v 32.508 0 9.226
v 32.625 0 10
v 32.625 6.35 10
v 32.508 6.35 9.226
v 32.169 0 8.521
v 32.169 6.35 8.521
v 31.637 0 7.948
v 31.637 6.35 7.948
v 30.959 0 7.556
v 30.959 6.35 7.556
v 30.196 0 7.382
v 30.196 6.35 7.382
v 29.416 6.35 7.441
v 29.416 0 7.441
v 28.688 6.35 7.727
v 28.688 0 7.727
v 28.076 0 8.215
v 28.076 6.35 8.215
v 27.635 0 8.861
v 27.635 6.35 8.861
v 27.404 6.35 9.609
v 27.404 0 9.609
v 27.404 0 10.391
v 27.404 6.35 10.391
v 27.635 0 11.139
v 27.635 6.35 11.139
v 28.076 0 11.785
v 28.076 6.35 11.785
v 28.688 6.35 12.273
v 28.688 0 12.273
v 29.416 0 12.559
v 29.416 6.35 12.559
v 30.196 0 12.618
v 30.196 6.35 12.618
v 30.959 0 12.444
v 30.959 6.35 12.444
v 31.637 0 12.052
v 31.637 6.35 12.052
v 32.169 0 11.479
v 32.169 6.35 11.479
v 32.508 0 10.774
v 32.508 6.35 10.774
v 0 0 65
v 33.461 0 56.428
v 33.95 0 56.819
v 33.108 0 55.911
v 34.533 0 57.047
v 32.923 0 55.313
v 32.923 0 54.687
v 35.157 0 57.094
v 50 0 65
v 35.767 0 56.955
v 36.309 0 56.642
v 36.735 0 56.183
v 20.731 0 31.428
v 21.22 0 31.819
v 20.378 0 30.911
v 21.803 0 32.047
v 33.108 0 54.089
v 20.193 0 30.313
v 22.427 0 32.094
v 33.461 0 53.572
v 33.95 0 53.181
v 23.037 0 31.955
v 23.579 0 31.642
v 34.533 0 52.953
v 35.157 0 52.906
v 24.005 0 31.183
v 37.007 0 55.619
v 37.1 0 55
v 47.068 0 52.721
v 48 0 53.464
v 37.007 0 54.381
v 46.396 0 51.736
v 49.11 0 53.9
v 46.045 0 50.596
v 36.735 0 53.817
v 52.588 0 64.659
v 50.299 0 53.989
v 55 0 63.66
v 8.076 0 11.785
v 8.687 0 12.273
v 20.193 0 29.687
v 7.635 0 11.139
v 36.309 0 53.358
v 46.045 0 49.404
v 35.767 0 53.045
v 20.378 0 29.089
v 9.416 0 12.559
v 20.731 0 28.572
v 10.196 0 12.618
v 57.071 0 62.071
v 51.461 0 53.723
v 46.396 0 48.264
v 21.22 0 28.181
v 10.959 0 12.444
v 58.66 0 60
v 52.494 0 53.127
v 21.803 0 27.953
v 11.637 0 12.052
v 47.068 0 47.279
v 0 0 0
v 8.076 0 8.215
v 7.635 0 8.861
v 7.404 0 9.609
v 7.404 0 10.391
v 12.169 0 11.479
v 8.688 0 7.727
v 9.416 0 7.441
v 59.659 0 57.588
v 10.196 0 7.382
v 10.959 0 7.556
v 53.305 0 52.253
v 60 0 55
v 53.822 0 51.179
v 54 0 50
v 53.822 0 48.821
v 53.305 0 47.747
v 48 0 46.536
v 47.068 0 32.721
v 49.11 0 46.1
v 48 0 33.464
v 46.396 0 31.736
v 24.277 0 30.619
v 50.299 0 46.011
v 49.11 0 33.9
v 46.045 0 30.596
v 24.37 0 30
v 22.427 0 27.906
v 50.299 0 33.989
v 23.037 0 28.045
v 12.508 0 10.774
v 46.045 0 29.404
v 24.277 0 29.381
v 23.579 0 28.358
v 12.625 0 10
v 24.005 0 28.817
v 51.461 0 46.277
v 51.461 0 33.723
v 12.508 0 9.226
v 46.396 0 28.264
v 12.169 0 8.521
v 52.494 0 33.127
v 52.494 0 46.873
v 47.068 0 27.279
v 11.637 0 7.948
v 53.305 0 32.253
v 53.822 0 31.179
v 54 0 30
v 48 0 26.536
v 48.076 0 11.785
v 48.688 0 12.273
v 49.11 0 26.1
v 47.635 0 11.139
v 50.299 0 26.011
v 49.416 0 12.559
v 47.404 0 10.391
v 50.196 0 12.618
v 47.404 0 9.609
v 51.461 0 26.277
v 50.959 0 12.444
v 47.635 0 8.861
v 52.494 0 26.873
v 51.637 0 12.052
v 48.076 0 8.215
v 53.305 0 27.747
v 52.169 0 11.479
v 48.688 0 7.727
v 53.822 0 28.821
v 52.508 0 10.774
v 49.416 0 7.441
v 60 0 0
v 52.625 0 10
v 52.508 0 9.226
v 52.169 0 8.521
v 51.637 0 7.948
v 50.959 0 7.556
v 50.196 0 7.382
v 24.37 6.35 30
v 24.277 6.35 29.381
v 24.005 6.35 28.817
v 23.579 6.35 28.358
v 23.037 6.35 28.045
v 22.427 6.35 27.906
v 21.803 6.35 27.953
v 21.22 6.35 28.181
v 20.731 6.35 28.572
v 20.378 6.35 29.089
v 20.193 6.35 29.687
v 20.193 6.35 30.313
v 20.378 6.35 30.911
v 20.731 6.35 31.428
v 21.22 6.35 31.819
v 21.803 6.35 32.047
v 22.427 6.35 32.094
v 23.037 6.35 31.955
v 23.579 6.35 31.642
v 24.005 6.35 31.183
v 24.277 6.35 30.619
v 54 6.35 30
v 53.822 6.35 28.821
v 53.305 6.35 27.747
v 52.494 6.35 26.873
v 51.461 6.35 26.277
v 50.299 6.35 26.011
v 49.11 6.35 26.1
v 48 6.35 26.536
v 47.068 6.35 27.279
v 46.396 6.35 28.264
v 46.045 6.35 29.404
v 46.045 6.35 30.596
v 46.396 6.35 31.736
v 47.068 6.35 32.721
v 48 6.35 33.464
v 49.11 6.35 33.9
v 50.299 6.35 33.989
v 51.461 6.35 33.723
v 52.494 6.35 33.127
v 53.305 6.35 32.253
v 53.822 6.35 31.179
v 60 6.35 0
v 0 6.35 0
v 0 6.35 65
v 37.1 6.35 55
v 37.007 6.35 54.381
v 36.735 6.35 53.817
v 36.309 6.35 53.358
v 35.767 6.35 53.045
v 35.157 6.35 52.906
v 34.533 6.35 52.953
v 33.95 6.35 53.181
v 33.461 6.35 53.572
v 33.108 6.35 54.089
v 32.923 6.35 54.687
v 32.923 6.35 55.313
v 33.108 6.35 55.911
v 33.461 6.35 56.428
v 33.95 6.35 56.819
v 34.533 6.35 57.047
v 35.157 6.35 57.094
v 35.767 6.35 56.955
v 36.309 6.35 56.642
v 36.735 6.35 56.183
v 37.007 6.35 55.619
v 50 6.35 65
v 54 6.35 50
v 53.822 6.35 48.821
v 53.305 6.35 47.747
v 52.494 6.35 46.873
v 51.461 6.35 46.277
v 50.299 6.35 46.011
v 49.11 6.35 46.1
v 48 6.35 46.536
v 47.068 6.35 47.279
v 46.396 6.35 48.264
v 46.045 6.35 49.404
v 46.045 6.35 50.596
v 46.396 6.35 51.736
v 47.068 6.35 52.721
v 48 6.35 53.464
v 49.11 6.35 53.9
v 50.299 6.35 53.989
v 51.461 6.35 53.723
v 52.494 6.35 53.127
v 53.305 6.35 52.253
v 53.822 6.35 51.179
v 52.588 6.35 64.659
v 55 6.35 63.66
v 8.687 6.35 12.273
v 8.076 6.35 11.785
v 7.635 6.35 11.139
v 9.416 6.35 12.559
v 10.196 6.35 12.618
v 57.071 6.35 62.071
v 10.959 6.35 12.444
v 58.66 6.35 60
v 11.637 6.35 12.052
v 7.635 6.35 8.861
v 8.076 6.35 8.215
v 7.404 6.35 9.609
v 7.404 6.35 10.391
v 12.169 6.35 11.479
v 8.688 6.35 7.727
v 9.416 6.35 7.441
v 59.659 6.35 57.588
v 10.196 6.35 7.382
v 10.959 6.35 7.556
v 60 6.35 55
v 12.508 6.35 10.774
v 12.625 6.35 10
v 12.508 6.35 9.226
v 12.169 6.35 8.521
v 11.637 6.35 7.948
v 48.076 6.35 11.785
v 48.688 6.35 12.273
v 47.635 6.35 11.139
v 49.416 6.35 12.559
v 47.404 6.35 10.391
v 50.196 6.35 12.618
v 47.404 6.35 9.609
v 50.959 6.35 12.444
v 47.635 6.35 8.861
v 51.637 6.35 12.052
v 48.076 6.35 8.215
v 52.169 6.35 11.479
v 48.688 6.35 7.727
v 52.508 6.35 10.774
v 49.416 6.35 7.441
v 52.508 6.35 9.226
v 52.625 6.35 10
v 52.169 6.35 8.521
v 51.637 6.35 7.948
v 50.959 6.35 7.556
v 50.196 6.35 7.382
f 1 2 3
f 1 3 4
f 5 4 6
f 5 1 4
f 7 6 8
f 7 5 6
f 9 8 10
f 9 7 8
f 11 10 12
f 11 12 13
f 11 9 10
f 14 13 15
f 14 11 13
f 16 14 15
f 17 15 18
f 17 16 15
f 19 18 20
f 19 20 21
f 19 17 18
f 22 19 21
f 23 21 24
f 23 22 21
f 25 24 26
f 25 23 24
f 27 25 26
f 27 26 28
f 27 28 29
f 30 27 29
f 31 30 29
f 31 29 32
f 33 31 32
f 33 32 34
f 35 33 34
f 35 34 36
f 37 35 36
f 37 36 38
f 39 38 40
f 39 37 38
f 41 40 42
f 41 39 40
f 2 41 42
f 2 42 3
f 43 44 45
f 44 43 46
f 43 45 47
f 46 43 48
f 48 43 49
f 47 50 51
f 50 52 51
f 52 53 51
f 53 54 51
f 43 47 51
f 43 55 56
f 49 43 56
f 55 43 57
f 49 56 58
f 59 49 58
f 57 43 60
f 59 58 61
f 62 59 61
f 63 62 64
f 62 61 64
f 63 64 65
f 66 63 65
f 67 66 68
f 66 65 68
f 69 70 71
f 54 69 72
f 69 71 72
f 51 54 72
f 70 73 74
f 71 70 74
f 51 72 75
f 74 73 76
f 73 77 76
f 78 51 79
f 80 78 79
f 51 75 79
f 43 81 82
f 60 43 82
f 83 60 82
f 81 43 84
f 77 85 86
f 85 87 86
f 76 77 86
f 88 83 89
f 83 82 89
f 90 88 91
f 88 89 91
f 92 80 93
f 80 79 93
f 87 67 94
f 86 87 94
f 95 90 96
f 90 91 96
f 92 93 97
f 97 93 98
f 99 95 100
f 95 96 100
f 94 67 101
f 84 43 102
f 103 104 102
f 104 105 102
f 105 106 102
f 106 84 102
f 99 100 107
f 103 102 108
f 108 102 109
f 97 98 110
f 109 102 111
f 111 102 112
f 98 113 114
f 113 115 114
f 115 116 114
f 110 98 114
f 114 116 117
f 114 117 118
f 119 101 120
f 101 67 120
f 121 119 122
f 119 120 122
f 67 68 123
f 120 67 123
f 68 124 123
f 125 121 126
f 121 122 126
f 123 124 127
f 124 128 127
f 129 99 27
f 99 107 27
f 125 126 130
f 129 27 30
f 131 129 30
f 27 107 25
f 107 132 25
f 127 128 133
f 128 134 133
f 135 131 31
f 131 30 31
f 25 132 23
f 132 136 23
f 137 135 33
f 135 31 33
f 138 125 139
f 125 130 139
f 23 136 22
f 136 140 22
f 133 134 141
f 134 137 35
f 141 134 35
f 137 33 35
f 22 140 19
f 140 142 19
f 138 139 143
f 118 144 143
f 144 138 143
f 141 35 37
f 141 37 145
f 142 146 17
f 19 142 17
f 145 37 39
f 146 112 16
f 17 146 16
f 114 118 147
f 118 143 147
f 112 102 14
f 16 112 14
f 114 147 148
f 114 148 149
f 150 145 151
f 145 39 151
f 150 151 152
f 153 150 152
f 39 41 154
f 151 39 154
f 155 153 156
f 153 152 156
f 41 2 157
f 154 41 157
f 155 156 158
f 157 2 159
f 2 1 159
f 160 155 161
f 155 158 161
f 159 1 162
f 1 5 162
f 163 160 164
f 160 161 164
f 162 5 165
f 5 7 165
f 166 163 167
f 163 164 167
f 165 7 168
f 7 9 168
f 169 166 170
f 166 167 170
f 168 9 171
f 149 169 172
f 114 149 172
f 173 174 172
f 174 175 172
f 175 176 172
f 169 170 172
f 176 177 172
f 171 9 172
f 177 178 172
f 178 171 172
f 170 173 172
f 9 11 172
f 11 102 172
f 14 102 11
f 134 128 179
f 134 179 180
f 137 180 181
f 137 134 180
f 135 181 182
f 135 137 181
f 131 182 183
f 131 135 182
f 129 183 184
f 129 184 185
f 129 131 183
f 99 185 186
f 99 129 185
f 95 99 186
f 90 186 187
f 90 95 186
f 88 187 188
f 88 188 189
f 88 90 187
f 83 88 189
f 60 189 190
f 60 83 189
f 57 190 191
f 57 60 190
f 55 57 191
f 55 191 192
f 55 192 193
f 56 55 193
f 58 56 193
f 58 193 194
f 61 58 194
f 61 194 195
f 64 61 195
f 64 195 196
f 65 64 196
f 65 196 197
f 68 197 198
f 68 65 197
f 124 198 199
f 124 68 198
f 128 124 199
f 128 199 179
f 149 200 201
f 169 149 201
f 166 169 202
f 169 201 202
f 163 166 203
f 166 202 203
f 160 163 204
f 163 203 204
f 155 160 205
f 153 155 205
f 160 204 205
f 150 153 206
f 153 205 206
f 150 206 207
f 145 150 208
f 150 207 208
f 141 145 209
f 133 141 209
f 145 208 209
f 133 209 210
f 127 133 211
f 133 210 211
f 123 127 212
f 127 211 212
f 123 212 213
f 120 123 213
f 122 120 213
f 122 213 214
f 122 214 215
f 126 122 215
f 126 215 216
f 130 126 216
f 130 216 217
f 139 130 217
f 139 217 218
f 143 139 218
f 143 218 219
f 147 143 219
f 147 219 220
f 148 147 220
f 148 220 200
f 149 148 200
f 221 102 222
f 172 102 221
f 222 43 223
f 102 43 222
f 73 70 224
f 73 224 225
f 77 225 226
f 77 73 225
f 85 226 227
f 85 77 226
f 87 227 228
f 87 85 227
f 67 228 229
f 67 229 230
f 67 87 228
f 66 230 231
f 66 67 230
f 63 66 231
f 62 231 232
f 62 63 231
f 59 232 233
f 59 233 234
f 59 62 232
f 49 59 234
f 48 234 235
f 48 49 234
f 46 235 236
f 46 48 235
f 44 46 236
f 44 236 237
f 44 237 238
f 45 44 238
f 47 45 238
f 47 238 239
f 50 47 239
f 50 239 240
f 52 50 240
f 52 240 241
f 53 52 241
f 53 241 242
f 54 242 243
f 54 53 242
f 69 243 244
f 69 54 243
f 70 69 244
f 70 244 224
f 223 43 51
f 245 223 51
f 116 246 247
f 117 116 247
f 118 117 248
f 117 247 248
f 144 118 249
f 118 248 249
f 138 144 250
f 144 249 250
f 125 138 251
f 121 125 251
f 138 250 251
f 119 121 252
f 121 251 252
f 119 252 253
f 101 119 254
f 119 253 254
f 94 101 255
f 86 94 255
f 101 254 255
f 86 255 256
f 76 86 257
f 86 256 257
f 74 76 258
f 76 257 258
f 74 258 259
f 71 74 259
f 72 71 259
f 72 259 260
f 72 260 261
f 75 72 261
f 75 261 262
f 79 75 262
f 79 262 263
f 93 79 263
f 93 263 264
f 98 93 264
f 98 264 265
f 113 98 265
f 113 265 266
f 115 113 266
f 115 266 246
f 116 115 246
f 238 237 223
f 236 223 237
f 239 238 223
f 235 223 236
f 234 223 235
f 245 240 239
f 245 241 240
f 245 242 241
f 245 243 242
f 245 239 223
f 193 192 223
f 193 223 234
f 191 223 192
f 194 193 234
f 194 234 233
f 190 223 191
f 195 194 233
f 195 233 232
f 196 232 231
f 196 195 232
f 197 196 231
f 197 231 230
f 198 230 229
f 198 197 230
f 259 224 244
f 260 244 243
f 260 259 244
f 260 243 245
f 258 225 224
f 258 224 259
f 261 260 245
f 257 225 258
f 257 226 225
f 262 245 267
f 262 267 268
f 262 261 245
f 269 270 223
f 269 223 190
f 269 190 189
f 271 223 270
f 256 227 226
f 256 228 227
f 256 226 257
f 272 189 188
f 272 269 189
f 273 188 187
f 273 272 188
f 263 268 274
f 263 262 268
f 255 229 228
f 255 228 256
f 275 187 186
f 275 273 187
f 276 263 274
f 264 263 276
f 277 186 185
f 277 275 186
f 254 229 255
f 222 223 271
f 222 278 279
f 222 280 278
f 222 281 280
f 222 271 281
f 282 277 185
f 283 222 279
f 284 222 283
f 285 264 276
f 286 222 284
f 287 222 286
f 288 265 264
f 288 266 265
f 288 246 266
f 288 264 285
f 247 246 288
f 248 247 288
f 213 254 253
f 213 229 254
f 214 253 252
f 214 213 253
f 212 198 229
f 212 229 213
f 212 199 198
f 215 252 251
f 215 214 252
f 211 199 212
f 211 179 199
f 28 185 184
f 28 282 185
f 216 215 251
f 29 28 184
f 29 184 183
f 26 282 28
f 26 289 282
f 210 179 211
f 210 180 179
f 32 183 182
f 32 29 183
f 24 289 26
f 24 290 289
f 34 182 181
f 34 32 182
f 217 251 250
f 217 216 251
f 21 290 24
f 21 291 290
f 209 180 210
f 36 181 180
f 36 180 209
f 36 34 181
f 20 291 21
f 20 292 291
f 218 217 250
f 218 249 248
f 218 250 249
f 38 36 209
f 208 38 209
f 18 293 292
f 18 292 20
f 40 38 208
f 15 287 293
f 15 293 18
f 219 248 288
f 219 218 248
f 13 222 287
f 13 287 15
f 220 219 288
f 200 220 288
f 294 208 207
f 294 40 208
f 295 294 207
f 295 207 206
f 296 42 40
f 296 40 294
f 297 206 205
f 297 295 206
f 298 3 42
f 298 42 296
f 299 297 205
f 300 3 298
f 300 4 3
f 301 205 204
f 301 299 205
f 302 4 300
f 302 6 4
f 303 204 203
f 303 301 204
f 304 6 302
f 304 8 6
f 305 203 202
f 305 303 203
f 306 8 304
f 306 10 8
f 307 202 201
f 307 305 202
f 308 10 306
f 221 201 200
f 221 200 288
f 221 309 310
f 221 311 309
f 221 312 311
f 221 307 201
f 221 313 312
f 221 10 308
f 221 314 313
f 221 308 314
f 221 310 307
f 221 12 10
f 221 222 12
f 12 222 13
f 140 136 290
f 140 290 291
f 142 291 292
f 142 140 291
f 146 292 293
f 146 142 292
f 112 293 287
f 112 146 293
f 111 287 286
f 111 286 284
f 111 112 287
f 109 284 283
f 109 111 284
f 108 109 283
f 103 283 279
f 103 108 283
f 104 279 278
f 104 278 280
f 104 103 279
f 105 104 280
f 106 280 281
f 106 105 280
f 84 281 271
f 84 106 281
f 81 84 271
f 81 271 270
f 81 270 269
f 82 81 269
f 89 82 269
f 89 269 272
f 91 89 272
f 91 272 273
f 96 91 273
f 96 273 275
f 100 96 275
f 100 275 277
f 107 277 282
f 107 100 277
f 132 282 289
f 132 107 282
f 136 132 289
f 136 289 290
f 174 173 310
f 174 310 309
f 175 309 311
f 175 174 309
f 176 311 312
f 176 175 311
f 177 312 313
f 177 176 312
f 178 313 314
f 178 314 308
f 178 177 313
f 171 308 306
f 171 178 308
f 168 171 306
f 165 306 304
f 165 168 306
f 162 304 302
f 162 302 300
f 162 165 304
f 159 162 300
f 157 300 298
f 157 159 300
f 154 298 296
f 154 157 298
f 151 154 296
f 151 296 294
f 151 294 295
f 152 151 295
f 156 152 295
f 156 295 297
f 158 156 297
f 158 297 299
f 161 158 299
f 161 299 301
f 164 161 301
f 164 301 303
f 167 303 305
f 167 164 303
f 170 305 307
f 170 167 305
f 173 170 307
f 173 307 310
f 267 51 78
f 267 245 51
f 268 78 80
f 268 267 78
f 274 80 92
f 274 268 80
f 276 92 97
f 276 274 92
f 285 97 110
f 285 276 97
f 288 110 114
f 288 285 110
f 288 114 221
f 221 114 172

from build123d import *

# Parameters (mm, degrees)
SKETCH1_W           = 60
SKETCH1_H           = 65
SKETCH1_R           = 2.625
SKETCH1_R_2         = 2.1
BOSS_EXTRUDE1_DEPTH = 6.35
FILLET1_R           = 10
SKETCH2_R           = 4
CUT_EXTRUDE1_DEPTH  = 7.35


with BuildPart() as part:
    # Sketch1 → Boss-Extrude1 (new body)
    with BuildSketch(Plane(origin=(0, 0, 0), x_dir=(1, 0, 0), z_dir=(0, 1, 0))):
        with Locations((30, -32.5)):
            Rectangle(SKETCH1_W, SKETCH1_H)
        with Locations((10, -10)):
            Circle(SKETCH1_R, mode=Mode.SUBTRACT)
        with Locations((30, -10)):
            Circle(SKETCH1_R, mode=Mode.SUBTRACT)
        with Locations((50, -10)):
            Circle(SKETCH1_R, mode=Mode.SUBTRACT)
        with Locations((22.27, -30)):
            Circle(SKETCH1_R_2, mode=Mode.SUBTRACT)
        with Locations((35, -55)):
            Circle(SKETCH1_R_2, mode=Mode.SUBTRACT)
    extrude(amount=BOSS_EXTRUDE1_DEPTH)

    # Fillet1
    fillet1_edges = [part.edges().sort_by_distance(p)[0] for p in [
        (60, 3.175, 65),
    ]]
    fillet(fillet1_edges, radius=FILLET1_R)

    # Sketch2 → Cut-Extrude1 (cut, through all)
    with BuildSketch(Plane(origin=(0, 6.35, 0), x_dir=(1, 0, 0), z_dir=(0, 1, 0))):
        with Locations((50, -30)):
            Circle(SKETCH2_R)
        with Locations((50, -50)):
            Circle(SKETCH2_R)
    extrude(amount=-CUT_EXTRUDE1_DEPTH, mode=Mode.SUBTRACT)


solid = part.part
